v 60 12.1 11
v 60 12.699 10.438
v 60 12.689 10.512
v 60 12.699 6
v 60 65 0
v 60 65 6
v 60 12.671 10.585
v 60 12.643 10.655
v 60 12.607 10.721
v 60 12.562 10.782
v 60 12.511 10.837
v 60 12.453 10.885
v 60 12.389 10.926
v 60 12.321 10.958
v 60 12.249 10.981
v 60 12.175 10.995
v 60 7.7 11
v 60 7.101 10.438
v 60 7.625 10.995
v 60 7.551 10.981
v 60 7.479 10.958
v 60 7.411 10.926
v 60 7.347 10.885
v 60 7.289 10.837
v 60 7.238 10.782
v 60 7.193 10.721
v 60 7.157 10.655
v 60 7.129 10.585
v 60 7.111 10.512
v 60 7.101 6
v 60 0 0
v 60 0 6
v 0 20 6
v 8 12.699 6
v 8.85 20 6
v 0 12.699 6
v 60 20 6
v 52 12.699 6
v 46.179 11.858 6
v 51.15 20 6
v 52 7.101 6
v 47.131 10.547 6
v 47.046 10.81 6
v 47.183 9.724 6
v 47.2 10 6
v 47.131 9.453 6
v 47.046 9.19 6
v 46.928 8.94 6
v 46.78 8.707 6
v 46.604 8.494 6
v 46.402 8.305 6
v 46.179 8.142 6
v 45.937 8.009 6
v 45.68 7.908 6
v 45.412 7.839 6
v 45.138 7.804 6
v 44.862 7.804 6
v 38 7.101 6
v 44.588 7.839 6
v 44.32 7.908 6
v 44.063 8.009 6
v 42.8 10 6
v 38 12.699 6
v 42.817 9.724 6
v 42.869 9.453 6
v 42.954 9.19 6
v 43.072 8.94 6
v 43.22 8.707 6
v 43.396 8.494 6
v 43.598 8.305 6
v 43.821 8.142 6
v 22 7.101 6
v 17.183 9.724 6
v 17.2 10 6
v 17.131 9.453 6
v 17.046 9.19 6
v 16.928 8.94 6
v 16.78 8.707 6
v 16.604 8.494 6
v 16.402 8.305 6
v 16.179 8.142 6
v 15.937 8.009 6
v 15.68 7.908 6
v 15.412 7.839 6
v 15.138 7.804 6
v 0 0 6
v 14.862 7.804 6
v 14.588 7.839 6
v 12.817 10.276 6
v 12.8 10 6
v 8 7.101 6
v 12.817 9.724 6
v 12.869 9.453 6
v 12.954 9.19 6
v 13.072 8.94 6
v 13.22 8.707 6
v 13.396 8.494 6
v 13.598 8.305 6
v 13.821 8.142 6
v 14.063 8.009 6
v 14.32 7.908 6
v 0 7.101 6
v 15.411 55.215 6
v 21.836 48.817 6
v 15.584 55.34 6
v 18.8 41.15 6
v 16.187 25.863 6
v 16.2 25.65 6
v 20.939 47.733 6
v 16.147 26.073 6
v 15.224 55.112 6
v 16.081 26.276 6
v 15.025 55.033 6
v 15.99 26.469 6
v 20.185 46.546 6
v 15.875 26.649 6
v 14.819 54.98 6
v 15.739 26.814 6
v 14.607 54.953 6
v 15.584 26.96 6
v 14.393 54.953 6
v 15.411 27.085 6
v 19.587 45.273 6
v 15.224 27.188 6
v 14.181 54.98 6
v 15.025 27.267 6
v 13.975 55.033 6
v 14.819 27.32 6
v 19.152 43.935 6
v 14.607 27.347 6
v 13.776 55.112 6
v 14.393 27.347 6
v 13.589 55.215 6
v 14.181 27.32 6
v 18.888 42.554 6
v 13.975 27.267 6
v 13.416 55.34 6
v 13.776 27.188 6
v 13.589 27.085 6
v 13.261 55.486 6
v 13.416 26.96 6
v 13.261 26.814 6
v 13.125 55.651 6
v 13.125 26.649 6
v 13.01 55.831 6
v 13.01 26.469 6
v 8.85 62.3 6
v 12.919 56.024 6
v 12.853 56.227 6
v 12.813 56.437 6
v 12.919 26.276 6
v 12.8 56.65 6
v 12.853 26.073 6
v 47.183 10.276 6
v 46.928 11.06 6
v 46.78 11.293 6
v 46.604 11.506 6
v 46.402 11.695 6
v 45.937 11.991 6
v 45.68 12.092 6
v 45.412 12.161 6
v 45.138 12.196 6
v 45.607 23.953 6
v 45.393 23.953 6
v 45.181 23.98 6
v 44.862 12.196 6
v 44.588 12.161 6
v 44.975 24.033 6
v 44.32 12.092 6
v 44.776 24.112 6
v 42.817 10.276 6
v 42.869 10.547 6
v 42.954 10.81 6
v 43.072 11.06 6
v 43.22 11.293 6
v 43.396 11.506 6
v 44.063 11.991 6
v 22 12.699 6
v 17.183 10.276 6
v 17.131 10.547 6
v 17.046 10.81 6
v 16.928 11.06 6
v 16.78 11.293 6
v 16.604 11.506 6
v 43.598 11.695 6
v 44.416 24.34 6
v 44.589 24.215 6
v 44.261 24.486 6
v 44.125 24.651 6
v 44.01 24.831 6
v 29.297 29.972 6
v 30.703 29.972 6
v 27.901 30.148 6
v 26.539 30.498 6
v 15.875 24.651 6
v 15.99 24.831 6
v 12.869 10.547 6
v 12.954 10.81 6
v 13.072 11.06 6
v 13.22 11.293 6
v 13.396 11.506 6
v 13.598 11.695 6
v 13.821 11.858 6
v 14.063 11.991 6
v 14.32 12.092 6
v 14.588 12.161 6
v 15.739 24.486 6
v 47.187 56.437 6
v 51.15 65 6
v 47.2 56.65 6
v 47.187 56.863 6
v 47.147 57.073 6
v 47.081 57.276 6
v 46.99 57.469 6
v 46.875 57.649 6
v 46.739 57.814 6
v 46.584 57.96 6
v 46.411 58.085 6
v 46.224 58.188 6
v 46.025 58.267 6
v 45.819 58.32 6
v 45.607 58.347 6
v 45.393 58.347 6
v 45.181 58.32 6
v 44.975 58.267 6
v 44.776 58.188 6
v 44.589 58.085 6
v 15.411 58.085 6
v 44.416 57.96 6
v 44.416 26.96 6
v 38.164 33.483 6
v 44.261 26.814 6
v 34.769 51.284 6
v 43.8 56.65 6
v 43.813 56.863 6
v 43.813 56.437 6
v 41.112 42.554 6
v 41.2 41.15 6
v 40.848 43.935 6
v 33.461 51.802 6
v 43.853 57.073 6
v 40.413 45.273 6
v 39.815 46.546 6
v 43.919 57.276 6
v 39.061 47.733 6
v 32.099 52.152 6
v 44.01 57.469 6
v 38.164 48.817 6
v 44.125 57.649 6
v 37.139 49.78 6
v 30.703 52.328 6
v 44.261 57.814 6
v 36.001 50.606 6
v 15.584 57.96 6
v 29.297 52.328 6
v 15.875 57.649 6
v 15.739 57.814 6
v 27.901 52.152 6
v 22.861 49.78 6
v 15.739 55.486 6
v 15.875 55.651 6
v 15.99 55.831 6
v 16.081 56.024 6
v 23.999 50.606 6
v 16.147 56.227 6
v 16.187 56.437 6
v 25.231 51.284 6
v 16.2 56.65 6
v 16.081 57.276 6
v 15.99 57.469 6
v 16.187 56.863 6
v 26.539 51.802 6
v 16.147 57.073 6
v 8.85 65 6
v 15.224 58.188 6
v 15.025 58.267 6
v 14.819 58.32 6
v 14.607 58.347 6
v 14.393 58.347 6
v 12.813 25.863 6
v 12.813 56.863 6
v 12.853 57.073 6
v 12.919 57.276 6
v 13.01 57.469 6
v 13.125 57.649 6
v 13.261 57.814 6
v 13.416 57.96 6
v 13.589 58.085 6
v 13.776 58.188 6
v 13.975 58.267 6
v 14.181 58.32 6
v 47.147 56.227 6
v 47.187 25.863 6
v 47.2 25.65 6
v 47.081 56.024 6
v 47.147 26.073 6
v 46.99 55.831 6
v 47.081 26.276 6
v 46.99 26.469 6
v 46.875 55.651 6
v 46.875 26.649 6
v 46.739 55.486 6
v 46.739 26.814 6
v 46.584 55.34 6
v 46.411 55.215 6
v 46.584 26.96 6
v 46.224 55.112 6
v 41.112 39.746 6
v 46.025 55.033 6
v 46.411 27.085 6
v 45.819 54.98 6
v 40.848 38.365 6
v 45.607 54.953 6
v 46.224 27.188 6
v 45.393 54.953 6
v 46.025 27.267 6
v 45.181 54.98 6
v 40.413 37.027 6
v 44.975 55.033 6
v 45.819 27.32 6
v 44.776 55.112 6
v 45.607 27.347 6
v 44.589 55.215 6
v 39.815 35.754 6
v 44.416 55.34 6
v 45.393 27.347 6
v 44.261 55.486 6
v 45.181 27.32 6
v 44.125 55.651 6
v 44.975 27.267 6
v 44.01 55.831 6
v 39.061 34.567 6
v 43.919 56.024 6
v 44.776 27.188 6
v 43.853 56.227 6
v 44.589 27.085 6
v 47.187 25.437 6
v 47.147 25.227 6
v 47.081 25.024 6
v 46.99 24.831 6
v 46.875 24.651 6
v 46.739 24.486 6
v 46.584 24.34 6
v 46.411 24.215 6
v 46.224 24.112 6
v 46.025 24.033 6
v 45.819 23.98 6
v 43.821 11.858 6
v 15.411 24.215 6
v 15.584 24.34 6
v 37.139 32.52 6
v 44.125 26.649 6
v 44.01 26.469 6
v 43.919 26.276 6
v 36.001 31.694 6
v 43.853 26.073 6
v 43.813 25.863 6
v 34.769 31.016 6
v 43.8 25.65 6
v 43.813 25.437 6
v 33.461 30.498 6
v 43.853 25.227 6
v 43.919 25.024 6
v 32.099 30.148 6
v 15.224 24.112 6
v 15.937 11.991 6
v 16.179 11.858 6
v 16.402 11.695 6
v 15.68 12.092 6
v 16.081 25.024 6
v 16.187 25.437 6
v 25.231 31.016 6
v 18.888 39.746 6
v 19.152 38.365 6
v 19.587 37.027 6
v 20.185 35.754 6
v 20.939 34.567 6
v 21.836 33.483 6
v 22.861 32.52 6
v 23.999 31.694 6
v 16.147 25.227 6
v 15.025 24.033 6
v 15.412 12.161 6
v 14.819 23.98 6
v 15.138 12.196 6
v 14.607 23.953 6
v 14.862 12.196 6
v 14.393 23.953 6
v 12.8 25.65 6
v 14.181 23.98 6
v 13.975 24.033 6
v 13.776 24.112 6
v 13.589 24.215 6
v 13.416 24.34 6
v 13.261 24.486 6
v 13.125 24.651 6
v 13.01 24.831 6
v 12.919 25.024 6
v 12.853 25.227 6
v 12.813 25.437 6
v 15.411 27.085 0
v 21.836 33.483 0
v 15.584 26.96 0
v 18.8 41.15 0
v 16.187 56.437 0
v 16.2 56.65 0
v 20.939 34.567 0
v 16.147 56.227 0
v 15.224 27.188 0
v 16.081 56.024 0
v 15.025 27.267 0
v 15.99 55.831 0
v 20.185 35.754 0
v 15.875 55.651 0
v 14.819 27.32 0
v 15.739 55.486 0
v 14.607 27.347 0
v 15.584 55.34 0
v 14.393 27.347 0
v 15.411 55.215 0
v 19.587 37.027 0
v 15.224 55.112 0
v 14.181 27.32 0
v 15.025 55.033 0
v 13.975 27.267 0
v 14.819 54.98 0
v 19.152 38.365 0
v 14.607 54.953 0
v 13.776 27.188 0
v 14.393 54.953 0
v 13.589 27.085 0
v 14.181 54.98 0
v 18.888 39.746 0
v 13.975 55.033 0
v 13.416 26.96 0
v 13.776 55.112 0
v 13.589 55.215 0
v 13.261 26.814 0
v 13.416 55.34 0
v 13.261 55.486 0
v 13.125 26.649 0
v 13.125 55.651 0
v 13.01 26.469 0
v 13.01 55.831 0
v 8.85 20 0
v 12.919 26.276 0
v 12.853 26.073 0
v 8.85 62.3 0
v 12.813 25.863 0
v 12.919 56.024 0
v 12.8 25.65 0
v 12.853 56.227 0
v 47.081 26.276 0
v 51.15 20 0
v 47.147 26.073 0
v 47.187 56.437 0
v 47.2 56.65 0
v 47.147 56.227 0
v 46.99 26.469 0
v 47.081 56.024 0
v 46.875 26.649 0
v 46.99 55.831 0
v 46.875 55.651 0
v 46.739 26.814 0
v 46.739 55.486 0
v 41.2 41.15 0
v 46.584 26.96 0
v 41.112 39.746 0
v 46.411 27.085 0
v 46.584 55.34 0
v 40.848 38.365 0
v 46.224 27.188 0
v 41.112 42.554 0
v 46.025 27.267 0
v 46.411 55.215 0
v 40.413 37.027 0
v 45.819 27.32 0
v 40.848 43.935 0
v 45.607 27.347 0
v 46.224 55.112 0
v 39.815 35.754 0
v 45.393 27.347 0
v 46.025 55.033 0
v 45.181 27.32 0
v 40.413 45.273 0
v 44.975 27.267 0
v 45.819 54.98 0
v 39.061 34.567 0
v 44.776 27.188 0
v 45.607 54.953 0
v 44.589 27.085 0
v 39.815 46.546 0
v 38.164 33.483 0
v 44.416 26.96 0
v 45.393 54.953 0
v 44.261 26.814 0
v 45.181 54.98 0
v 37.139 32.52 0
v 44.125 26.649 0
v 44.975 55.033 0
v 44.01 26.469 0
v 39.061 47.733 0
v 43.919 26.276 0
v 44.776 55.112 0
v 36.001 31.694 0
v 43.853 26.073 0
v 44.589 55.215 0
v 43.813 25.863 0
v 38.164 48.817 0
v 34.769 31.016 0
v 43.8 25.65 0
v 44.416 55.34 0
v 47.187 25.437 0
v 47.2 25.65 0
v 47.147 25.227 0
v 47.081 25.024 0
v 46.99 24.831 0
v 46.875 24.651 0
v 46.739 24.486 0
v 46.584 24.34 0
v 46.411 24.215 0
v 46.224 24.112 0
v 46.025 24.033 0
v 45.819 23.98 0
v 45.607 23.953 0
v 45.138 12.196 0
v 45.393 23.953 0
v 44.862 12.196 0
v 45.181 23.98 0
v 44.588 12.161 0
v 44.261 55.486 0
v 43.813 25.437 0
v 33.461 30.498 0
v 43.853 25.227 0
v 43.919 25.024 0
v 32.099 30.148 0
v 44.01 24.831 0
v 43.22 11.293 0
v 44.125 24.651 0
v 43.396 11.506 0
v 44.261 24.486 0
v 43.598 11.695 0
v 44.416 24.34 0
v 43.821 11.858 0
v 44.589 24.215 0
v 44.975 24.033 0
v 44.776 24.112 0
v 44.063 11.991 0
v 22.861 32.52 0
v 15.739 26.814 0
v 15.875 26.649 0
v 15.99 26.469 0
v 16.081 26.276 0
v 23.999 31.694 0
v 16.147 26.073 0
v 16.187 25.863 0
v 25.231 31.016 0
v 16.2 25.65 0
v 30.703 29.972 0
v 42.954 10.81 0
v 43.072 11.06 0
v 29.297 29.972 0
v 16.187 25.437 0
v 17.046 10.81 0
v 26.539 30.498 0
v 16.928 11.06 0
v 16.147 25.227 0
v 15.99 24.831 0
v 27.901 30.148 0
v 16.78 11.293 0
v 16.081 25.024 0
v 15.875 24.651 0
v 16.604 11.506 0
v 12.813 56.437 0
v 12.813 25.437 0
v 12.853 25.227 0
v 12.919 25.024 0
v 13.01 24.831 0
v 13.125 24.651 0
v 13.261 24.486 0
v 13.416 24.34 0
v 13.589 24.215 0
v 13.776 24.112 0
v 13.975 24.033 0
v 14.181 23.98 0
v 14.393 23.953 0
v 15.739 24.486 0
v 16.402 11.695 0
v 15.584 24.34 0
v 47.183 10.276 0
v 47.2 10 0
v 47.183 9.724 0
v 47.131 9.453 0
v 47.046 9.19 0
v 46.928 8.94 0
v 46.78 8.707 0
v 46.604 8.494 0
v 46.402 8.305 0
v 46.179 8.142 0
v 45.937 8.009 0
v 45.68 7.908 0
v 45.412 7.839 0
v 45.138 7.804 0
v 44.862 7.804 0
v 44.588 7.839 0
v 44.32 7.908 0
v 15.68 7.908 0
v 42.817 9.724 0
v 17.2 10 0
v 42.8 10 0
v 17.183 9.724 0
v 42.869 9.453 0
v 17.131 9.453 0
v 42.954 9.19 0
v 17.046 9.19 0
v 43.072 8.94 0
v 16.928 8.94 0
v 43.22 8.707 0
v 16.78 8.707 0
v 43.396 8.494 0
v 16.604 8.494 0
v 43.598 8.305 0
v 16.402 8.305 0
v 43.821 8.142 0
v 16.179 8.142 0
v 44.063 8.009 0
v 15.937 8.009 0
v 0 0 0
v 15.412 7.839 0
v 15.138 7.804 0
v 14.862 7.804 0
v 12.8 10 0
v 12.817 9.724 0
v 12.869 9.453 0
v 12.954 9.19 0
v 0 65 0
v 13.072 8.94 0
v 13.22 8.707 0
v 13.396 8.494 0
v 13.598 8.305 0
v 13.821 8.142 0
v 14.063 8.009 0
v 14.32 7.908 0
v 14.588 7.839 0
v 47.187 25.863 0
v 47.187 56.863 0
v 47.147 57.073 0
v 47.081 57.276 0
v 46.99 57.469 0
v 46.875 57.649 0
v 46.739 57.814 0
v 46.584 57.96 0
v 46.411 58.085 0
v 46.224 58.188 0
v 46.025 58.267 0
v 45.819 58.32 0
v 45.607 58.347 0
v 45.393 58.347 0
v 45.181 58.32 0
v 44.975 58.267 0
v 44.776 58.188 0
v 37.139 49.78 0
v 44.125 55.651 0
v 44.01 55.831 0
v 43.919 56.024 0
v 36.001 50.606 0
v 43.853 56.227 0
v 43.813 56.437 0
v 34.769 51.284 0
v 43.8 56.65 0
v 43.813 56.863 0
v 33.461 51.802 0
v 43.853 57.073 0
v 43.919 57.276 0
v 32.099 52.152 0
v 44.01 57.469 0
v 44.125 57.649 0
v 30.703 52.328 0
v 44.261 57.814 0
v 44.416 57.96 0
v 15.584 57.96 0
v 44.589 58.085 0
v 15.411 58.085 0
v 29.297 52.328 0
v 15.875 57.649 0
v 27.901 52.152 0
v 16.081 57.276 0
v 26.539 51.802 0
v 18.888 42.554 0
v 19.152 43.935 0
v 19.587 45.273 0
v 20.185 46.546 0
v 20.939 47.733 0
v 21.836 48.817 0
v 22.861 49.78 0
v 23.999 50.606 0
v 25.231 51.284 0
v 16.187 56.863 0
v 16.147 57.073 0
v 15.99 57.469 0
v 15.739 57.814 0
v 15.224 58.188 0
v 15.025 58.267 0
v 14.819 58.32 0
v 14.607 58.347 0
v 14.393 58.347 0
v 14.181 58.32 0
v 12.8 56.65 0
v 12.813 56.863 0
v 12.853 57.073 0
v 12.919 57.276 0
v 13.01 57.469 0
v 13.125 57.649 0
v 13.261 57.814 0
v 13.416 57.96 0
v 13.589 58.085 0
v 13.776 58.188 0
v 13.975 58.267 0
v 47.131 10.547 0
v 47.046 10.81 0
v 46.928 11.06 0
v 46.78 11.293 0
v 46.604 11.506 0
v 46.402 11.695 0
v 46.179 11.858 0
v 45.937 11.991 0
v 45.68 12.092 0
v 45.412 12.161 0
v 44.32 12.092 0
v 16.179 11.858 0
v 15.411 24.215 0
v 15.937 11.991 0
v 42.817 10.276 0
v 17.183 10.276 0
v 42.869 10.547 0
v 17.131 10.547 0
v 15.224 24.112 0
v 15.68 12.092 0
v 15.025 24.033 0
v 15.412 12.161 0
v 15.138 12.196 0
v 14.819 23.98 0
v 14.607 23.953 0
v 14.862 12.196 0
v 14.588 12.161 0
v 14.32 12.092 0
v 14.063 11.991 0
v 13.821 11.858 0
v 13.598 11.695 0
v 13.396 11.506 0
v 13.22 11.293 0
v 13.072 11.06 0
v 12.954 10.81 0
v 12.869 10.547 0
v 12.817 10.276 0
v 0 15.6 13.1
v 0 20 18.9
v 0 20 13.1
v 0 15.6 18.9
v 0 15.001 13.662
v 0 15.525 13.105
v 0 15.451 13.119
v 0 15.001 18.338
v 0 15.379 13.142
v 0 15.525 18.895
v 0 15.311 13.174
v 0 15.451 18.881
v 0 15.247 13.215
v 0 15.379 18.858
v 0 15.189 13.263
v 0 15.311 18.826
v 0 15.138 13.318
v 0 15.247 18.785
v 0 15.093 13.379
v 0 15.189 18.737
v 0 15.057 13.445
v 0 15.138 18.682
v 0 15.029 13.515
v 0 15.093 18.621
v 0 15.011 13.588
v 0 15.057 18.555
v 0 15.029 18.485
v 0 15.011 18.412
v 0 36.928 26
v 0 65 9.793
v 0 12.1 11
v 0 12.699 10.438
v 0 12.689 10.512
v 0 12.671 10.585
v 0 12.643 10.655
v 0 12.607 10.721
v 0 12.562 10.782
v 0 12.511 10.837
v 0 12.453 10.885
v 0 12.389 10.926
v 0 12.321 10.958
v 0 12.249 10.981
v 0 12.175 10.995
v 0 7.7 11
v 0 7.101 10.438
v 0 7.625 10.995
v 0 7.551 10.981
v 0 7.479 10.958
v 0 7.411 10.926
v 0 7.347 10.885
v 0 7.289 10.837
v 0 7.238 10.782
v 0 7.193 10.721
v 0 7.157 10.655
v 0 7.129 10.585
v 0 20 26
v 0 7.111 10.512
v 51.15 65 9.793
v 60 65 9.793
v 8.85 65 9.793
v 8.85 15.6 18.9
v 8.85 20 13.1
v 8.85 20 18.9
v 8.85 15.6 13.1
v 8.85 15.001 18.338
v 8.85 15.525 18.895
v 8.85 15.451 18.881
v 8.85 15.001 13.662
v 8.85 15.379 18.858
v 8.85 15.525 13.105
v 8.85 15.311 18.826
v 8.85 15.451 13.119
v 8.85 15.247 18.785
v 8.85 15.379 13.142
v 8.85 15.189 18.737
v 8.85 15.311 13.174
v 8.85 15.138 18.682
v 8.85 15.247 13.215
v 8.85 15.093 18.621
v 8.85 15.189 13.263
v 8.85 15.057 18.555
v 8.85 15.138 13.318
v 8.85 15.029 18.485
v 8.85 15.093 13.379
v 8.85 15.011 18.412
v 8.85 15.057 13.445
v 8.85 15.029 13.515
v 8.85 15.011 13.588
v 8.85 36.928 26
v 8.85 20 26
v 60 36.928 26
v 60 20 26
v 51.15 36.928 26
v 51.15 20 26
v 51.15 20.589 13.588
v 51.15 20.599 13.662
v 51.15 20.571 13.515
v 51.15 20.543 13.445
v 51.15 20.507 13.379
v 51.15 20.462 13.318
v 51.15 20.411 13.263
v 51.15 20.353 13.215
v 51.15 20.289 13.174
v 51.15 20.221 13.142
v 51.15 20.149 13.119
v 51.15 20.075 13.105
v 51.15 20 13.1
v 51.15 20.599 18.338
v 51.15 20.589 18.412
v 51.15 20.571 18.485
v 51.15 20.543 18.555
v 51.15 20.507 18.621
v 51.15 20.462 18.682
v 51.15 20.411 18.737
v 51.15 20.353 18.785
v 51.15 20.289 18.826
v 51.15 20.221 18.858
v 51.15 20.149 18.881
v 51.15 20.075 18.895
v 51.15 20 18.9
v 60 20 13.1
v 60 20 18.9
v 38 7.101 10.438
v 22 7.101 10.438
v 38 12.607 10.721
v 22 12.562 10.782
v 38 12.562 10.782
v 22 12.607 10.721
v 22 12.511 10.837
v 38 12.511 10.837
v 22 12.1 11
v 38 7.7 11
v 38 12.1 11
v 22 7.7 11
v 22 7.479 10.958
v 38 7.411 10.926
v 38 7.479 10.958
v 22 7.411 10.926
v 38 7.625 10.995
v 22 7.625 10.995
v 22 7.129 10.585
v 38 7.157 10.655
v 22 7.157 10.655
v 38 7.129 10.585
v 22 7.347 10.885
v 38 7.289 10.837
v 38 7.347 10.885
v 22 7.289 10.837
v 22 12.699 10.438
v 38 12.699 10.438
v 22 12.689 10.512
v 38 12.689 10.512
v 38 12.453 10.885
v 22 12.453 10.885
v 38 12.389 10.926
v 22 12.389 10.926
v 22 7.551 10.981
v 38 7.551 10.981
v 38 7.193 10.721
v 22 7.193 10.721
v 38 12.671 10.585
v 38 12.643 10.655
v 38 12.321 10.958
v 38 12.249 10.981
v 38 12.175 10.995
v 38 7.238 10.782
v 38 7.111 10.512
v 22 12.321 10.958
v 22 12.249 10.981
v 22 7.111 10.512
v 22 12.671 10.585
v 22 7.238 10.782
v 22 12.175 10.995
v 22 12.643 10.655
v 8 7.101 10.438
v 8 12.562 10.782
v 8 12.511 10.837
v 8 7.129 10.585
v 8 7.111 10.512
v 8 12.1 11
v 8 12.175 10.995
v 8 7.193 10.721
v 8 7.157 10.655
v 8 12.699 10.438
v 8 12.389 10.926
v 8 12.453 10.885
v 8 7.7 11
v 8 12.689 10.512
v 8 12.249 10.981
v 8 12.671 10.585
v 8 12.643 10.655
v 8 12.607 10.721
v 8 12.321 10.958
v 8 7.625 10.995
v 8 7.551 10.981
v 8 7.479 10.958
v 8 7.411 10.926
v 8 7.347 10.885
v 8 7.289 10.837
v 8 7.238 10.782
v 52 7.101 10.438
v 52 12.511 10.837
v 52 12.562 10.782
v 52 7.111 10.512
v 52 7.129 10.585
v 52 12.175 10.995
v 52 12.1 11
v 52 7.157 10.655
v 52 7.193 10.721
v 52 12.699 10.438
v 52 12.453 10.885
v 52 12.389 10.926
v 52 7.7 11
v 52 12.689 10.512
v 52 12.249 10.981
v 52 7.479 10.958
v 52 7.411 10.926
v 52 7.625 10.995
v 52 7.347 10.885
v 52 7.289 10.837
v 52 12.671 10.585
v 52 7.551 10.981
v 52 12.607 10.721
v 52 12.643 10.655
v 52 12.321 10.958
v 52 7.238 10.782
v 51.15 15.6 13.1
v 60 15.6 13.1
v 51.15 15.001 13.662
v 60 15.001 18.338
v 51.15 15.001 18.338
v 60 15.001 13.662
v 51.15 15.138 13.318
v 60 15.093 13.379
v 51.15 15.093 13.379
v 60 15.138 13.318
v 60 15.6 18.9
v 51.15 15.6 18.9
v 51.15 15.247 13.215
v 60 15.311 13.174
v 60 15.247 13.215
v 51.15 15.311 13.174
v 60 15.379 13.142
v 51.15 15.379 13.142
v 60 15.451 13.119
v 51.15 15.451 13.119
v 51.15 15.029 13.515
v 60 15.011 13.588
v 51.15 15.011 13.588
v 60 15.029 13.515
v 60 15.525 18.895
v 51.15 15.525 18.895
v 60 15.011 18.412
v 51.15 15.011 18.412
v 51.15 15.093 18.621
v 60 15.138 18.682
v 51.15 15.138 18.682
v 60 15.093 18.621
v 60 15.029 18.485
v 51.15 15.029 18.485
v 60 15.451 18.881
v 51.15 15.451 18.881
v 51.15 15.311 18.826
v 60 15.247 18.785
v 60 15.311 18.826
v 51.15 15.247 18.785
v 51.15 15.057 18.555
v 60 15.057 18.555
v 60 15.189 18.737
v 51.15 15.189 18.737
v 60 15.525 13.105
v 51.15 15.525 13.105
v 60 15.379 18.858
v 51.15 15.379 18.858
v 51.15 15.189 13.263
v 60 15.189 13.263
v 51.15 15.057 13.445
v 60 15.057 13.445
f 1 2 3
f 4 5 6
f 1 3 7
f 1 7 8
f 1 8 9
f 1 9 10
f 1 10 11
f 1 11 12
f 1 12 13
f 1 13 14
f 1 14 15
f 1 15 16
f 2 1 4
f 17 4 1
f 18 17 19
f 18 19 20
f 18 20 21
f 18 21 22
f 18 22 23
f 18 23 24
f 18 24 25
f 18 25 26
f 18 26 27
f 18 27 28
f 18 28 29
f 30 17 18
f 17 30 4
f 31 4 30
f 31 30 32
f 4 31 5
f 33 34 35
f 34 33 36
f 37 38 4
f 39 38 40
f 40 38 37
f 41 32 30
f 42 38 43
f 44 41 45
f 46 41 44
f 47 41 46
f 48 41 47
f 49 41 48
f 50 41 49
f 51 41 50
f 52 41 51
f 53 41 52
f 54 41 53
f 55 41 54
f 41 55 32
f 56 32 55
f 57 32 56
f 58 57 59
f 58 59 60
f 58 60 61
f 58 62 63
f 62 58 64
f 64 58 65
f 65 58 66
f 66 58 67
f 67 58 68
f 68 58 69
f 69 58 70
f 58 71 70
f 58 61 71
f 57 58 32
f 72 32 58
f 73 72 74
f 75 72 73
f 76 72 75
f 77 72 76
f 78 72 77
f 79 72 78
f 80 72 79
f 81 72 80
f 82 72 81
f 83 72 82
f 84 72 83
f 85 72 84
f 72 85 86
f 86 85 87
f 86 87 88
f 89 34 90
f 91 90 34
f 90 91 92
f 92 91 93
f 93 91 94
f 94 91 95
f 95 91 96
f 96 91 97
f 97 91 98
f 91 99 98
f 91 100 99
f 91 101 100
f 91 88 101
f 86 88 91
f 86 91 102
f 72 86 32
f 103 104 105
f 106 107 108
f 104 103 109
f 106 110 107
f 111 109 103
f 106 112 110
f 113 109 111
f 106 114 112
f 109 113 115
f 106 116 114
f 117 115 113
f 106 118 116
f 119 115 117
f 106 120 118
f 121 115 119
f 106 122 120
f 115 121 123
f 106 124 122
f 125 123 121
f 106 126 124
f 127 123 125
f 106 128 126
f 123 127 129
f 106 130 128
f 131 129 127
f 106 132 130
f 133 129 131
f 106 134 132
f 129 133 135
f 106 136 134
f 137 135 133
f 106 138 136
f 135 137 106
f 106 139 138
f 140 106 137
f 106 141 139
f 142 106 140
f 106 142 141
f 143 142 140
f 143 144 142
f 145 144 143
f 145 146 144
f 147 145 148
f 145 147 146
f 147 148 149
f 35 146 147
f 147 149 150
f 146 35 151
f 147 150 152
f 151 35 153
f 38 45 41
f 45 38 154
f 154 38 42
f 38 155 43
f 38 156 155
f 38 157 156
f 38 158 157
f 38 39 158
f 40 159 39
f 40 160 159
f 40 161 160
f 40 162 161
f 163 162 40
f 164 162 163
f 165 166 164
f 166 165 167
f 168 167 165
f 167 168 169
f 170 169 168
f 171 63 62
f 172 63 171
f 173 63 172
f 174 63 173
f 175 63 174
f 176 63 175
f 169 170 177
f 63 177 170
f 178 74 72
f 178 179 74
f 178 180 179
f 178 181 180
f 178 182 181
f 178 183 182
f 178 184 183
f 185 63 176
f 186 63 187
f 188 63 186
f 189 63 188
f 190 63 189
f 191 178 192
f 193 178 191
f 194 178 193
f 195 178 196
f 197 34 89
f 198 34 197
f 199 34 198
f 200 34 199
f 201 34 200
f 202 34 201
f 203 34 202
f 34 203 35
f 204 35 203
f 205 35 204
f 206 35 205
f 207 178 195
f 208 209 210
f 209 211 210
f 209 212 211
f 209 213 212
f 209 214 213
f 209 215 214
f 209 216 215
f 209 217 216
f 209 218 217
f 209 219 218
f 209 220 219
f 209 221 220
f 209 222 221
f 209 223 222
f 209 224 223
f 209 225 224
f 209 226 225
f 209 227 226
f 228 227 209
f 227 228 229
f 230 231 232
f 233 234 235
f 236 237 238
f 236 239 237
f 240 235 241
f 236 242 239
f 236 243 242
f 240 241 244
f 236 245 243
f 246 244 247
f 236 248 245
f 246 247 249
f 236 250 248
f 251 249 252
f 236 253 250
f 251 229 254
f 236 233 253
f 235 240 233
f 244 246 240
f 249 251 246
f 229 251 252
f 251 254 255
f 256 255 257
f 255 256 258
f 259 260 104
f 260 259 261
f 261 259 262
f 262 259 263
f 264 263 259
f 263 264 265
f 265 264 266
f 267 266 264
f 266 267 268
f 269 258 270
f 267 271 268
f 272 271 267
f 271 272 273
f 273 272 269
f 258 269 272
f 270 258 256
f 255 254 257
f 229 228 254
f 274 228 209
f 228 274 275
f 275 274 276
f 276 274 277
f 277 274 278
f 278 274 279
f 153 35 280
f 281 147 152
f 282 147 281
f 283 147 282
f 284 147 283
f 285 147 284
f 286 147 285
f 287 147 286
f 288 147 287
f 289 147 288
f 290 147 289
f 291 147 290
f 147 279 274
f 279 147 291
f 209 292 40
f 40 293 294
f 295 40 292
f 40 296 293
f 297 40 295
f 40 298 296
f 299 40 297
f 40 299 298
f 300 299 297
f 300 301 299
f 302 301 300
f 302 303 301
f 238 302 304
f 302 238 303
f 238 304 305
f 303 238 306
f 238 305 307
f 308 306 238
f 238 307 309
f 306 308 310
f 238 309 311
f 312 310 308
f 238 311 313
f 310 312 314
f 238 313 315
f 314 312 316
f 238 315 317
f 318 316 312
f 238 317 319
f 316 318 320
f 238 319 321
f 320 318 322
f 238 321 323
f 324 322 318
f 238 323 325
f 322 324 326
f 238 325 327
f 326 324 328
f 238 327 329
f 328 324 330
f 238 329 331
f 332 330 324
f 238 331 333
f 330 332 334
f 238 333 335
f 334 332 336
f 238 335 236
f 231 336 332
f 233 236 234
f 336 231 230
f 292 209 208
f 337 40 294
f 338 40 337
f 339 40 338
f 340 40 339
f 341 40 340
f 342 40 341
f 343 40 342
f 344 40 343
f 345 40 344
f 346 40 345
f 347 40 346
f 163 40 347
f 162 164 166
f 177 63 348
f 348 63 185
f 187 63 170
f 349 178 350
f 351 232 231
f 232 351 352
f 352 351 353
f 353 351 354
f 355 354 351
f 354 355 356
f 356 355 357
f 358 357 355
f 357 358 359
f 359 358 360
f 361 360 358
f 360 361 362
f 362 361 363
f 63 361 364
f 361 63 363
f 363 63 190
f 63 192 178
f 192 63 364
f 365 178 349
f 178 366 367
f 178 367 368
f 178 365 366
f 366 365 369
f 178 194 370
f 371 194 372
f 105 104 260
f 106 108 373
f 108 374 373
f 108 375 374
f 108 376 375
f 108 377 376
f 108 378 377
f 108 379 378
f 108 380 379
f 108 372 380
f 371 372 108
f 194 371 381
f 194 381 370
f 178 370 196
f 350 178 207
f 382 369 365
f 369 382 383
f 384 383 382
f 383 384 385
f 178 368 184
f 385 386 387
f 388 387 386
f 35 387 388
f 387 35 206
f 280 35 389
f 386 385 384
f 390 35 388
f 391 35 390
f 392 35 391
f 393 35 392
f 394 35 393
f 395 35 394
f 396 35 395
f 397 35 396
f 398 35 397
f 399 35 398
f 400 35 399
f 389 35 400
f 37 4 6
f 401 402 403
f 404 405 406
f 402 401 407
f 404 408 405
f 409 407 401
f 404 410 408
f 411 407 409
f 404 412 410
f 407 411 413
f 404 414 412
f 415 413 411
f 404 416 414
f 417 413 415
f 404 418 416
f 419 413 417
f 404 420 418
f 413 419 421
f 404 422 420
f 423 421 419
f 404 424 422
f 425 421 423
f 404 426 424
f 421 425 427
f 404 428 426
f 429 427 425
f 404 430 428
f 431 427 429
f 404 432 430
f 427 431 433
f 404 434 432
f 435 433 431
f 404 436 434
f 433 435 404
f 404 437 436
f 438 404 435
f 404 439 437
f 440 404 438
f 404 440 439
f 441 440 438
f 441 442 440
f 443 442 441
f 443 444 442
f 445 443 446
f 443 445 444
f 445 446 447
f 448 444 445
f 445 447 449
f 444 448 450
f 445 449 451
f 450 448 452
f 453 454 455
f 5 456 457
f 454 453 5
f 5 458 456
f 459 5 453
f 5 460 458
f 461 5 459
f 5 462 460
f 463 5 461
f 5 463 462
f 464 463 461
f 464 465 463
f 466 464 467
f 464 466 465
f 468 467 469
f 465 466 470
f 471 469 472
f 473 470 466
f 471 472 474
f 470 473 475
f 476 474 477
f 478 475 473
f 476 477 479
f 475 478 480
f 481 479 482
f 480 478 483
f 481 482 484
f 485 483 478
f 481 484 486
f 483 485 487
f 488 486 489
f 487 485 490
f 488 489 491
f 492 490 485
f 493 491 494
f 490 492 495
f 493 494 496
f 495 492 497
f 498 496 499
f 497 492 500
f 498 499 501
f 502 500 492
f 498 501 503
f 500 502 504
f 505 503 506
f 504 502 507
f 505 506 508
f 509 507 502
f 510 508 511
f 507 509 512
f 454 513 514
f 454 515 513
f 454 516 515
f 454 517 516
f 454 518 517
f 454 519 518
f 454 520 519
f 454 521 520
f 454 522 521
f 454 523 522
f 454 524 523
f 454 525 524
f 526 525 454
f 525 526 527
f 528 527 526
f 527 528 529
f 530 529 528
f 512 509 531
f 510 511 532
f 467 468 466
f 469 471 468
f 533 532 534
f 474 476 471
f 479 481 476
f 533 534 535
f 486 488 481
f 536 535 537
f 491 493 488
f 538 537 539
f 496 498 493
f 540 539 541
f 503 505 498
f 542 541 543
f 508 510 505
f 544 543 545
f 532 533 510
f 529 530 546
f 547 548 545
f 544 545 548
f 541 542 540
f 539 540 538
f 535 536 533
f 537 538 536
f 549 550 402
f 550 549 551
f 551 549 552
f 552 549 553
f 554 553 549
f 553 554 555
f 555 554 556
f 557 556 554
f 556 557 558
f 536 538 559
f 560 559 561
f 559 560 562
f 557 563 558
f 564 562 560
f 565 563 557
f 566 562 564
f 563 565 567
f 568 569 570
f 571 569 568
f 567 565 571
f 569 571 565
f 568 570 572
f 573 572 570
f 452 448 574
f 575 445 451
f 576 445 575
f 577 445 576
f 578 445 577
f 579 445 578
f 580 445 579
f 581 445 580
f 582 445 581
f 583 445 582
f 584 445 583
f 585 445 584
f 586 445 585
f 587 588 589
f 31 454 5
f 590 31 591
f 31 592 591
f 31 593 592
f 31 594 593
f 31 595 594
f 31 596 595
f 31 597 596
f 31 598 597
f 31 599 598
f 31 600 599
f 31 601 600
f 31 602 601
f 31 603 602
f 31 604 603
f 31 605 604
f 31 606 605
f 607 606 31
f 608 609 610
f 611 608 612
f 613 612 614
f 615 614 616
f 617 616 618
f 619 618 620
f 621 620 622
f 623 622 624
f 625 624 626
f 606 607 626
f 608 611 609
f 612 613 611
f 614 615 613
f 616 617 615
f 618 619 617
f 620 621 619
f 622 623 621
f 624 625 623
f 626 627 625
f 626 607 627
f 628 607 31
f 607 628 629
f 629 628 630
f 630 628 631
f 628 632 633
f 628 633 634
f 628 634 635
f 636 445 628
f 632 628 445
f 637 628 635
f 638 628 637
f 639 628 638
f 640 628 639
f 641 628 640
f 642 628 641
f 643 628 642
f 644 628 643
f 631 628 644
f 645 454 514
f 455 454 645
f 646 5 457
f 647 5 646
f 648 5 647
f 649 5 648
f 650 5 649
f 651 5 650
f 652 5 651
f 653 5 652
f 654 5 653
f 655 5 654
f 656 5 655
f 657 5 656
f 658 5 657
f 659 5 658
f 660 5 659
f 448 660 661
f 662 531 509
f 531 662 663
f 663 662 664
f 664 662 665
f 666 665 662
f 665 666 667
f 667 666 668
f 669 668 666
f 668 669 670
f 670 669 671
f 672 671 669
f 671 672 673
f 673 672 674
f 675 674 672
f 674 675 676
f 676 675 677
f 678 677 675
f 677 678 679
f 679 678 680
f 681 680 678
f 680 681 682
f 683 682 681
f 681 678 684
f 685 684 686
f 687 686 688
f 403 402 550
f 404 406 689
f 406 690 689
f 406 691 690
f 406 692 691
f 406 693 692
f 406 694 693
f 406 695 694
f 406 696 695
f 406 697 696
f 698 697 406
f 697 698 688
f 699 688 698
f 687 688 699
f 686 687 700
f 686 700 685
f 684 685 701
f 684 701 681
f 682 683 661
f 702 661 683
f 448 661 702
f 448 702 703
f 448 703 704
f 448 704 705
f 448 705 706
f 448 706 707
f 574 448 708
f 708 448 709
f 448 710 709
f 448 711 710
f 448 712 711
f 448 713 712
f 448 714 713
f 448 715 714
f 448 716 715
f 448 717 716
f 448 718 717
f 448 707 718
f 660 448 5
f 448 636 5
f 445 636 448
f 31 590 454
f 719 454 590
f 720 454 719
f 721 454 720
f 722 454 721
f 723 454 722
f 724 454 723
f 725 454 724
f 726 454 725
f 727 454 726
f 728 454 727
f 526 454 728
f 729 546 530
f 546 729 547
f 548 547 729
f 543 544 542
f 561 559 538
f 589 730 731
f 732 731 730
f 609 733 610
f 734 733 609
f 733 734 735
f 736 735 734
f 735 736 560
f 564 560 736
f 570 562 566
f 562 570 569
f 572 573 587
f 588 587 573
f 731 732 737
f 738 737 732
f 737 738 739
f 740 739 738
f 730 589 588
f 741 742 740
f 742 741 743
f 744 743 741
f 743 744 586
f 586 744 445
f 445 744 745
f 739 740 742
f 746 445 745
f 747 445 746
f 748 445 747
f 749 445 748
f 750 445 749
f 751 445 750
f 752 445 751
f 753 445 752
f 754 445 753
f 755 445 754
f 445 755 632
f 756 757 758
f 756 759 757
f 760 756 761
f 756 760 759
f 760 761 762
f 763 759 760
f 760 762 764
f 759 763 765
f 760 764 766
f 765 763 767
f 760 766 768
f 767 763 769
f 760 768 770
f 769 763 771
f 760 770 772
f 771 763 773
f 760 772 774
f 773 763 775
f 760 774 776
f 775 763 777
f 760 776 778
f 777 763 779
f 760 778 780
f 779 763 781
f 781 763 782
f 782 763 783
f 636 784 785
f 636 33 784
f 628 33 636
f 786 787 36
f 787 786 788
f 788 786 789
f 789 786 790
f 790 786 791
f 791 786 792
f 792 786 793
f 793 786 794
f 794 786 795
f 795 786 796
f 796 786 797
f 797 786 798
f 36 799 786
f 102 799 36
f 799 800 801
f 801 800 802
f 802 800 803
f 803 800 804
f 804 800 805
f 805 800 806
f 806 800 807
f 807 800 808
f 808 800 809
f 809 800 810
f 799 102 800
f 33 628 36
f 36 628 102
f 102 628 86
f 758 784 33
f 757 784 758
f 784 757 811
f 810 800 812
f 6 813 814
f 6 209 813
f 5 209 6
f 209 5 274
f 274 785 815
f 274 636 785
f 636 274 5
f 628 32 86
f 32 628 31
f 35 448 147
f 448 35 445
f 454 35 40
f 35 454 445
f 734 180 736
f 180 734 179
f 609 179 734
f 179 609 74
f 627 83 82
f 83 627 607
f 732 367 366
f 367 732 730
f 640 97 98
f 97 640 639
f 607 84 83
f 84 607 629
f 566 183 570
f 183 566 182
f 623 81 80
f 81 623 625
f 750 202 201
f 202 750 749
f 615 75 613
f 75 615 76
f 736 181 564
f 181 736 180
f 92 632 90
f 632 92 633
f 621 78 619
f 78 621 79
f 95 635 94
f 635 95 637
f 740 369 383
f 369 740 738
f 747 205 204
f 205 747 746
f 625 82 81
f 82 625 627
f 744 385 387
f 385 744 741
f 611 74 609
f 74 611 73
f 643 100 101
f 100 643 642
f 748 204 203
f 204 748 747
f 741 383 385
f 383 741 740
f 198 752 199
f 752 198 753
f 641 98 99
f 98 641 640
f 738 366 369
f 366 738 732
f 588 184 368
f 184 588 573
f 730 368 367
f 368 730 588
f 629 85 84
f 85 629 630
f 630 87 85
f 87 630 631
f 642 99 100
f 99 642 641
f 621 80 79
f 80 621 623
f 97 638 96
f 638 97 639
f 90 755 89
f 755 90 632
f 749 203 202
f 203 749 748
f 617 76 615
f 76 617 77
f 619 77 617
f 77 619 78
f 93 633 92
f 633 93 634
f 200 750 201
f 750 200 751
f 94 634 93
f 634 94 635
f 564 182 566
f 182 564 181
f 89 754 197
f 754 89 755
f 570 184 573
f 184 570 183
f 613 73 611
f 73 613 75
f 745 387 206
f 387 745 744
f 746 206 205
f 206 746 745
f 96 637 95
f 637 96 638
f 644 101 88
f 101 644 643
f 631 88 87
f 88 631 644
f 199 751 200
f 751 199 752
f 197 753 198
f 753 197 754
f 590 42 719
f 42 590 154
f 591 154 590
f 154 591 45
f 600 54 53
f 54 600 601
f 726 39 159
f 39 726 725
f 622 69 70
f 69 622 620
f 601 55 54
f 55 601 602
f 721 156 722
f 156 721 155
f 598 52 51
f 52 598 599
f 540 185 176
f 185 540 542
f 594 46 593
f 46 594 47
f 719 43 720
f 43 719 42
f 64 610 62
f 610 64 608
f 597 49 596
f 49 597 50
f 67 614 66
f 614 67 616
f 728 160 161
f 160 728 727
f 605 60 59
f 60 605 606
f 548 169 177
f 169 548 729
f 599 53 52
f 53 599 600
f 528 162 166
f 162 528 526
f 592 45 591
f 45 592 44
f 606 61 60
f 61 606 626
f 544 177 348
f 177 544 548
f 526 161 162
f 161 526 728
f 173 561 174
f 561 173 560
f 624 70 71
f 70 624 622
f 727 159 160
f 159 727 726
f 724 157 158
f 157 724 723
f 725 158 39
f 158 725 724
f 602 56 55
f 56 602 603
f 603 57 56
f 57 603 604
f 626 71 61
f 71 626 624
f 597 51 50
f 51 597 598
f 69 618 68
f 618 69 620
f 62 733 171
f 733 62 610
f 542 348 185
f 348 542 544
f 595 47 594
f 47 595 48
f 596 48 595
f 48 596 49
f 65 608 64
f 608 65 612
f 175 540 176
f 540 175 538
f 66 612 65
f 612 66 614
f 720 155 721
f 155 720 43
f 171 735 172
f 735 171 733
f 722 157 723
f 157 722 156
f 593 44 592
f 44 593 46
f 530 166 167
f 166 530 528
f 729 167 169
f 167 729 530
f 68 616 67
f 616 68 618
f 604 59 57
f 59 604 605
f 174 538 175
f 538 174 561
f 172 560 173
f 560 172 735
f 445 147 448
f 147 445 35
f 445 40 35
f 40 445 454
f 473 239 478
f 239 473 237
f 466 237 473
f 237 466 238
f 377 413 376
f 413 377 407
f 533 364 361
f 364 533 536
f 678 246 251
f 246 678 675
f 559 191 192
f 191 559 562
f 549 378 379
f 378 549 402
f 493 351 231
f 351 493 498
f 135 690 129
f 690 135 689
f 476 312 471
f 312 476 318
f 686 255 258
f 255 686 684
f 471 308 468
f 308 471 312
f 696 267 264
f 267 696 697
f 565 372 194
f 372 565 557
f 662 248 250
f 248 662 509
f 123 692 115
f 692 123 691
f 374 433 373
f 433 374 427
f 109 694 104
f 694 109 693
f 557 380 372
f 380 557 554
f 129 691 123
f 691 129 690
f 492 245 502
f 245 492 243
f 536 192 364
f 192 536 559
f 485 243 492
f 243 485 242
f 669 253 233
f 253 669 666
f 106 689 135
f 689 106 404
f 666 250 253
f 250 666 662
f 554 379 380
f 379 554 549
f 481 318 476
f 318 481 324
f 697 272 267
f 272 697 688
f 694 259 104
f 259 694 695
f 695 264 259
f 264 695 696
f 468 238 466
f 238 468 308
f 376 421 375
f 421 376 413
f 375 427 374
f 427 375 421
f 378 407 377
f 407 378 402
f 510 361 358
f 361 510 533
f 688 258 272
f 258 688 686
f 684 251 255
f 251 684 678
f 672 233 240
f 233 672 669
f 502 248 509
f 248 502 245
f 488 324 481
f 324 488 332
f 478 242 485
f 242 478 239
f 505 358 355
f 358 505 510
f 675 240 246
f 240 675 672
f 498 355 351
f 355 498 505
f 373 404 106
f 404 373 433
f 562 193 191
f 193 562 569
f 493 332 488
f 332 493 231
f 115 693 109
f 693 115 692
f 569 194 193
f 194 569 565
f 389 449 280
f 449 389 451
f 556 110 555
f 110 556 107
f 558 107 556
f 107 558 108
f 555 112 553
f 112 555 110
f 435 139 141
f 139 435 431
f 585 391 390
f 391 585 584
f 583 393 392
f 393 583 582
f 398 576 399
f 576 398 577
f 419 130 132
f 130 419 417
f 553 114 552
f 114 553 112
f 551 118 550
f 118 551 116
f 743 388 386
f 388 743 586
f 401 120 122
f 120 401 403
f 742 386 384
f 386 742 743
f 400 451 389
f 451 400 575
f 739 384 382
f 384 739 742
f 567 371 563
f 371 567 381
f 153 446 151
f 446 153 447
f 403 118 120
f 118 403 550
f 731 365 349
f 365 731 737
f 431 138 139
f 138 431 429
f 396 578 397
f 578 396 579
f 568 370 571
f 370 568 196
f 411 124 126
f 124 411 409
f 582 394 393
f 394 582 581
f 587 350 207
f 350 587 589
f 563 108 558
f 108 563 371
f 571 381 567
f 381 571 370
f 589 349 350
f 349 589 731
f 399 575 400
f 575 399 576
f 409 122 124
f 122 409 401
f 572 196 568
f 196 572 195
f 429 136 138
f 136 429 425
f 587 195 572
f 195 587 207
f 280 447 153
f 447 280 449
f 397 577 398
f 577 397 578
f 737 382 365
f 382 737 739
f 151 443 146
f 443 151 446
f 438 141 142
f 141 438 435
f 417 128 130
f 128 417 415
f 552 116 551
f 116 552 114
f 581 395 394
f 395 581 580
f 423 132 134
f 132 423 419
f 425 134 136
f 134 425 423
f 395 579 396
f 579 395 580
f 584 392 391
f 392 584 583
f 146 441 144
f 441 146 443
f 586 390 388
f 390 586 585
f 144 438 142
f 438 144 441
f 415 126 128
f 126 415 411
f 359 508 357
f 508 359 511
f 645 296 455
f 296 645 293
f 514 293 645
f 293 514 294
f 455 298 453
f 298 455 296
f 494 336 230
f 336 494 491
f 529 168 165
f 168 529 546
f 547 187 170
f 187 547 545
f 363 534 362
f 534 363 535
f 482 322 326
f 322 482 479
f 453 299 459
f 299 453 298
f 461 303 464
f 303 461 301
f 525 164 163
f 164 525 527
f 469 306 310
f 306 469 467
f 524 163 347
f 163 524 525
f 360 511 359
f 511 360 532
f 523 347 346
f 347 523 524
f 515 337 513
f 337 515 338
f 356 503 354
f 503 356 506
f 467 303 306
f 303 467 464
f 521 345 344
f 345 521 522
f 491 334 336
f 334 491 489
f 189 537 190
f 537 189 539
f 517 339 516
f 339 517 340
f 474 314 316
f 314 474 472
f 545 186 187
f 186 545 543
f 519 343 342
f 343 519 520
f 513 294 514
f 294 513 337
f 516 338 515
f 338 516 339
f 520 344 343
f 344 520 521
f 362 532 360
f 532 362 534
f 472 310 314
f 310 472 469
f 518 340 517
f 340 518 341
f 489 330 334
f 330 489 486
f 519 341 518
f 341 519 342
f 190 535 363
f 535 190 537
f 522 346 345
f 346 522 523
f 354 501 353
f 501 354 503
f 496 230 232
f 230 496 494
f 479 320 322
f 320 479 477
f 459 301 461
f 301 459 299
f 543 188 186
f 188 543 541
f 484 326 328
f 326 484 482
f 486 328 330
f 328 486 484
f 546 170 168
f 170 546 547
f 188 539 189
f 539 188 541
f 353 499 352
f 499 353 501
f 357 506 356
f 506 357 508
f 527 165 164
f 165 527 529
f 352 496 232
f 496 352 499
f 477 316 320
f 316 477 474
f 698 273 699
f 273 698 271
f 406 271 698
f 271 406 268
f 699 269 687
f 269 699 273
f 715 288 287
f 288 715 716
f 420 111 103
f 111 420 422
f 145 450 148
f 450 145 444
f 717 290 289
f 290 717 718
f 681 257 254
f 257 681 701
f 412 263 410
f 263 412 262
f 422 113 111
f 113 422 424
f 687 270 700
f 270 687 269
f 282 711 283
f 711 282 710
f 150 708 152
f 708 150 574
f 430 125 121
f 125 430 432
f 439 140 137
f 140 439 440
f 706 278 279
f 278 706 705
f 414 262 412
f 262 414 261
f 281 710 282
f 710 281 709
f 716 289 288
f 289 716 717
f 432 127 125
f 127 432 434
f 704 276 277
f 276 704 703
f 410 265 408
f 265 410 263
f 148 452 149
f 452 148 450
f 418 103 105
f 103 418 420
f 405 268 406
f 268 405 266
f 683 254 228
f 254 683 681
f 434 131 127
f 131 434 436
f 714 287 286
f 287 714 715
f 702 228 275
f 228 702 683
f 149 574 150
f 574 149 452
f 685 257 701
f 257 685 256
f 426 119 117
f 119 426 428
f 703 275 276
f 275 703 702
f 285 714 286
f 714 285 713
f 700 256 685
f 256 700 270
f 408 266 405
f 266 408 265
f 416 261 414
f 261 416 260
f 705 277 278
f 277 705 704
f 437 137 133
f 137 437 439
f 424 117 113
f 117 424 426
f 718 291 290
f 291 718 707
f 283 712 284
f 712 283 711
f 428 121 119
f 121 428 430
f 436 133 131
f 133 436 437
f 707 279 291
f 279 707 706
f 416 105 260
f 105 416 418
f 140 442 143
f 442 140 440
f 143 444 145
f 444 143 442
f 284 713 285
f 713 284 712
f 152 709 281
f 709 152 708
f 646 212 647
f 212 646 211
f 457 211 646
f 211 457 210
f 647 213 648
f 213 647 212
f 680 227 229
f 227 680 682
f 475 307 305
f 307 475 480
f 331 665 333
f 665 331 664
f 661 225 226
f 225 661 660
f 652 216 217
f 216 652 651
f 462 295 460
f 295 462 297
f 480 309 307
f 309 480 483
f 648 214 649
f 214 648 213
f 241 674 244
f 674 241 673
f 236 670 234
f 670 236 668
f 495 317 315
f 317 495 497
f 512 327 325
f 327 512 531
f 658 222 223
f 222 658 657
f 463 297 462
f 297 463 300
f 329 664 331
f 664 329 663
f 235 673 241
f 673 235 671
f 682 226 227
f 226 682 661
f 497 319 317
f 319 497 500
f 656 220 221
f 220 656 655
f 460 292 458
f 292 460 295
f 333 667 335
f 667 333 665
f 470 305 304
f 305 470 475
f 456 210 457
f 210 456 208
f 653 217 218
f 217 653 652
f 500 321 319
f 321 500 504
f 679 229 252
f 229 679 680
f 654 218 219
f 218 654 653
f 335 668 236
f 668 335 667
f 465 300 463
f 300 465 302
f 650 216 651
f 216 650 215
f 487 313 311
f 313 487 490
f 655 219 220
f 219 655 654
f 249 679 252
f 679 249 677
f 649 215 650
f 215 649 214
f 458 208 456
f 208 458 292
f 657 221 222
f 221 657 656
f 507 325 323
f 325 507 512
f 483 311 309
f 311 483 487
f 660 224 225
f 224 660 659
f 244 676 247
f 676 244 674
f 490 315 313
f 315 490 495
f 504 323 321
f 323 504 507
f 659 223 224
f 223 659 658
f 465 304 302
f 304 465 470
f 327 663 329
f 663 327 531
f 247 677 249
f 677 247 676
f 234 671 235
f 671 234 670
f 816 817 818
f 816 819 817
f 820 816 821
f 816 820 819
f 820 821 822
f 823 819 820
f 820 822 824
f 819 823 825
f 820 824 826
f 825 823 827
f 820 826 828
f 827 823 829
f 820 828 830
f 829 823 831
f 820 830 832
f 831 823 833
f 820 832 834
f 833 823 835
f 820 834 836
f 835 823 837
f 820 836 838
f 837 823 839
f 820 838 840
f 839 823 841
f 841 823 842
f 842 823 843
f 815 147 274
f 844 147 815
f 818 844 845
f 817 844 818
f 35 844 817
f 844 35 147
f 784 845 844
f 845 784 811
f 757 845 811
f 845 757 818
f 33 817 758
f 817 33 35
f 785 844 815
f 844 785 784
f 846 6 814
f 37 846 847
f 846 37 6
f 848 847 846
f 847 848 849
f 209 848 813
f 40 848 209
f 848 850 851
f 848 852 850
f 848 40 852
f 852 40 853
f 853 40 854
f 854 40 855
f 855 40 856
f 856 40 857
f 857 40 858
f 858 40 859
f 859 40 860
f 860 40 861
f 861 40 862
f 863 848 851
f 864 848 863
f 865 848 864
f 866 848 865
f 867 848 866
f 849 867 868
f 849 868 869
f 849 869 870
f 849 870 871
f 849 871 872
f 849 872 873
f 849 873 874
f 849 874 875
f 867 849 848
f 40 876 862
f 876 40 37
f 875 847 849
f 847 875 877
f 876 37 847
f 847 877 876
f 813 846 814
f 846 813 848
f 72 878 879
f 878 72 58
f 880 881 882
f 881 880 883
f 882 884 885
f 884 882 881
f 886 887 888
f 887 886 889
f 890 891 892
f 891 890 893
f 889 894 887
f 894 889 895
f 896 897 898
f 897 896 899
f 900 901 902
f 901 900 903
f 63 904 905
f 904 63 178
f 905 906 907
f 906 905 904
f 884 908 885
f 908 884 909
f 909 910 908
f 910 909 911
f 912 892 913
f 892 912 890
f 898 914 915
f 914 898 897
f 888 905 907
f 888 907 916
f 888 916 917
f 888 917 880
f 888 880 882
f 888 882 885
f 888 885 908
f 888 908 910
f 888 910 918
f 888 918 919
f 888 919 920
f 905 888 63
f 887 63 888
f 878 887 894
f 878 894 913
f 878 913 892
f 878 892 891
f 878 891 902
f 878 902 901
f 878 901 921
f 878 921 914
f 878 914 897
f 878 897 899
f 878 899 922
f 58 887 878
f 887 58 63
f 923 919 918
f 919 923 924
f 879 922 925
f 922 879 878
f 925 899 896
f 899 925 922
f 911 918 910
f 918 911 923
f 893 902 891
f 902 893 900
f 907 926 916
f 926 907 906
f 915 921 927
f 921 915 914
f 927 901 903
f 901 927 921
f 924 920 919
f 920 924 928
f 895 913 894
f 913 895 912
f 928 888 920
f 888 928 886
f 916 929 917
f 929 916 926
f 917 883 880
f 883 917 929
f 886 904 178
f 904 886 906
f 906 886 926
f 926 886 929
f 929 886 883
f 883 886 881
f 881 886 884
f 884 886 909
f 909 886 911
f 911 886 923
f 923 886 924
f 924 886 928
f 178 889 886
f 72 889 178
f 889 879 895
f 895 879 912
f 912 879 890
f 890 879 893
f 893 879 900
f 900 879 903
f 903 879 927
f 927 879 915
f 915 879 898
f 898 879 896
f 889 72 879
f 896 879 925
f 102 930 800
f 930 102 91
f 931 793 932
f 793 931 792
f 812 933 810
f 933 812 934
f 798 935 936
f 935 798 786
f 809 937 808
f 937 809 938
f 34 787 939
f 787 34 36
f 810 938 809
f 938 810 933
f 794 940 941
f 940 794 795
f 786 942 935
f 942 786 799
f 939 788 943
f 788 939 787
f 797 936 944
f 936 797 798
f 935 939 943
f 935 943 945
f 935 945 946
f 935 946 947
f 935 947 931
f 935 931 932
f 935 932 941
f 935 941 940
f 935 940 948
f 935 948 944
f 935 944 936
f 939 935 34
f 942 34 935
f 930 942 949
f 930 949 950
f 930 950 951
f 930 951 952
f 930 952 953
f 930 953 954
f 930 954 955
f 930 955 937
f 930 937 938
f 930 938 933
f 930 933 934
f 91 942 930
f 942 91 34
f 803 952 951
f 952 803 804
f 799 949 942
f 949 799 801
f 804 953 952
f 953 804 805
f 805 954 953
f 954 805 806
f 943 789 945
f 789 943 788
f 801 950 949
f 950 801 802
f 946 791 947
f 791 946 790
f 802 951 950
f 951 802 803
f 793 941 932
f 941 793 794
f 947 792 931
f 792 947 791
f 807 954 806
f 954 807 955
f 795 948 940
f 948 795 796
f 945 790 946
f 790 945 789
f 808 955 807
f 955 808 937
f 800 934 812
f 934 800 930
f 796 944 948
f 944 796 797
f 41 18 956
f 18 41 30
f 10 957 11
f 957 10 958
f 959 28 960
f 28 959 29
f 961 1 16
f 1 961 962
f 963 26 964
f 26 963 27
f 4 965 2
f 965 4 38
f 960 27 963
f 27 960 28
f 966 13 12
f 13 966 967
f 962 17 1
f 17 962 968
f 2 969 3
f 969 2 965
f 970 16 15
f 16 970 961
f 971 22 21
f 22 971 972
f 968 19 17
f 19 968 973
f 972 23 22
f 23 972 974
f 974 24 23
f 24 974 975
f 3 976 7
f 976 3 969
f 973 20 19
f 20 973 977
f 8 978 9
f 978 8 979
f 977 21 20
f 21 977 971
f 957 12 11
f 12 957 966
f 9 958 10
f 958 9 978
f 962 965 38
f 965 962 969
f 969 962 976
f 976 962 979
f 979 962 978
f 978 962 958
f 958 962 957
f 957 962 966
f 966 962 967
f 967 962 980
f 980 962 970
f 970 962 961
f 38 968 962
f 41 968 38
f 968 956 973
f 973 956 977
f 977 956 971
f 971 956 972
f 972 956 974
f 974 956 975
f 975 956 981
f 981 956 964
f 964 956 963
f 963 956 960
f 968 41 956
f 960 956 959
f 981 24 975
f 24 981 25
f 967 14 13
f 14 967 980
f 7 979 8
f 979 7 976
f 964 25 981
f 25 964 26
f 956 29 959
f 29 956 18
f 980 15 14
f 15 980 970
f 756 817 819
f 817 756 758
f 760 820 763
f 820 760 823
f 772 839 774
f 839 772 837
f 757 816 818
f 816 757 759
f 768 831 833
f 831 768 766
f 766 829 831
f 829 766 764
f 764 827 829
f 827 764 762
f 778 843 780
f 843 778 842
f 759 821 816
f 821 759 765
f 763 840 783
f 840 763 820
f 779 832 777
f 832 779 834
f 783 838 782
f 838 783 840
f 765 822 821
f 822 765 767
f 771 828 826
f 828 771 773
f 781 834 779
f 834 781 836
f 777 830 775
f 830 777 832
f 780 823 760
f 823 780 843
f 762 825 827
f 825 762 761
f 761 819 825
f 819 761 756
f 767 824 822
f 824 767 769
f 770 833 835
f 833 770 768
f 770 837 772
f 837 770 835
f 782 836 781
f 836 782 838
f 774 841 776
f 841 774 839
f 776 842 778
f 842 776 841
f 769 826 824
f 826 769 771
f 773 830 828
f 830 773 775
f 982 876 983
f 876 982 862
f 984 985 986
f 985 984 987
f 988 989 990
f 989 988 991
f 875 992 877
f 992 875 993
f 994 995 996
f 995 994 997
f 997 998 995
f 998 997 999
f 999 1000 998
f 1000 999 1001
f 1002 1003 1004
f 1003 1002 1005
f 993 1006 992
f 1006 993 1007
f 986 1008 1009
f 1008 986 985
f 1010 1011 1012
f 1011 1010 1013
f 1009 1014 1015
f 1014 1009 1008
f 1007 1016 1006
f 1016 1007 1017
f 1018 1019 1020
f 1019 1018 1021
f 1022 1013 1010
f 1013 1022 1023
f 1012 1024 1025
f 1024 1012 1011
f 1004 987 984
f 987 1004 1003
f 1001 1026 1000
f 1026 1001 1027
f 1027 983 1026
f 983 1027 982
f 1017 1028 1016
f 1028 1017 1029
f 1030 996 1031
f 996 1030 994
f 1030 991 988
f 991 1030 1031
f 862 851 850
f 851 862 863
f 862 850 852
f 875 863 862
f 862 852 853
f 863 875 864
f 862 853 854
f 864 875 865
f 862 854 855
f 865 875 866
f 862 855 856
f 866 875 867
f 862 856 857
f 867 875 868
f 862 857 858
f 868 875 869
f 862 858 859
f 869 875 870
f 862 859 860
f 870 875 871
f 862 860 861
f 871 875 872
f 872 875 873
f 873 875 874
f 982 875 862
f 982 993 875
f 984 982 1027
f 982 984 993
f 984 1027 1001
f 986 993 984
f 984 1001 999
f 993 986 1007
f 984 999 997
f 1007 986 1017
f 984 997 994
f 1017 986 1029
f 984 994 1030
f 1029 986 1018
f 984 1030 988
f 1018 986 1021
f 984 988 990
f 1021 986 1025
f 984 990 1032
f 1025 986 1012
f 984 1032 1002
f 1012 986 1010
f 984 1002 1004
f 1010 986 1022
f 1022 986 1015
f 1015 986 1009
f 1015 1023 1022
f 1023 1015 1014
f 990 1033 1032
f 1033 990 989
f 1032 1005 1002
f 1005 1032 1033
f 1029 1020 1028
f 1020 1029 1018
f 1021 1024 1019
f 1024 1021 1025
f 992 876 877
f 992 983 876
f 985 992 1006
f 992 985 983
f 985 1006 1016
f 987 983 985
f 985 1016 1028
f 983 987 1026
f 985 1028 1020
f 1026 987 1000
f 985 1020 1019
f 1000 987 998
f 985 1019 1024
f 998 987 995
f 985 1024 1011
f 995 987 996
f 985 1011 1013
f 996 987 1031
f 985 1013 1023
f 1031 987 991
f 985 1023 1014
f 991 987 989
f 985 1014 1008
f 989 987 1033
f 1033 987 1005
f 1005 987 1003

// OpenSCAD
// file: ../lib/nutsnbolts/data-access.scad
// Norm Nuts and Bolts - a OpenSCAD library
// Copyright (C) 2012  Johannes Kneer

// This program is free software: you can redistribute it and/or modify
// it under the terms of the GNU General Public License as published by
// the Free Software Foundation, either version 3 of the License, or
// (at your option) any later version.

// This program is distributed in the hope that it will be useful,
// but WITHOUT ANY WARRANTY; without even the implied warranty of
// MERCHANTABILITY or FITNESS FOR A PARTICULAR PURPOSE.  See the
// GNU General Public License for more details.

// You should have received a copy of the GNU General Public License
// along with this program.  If not, see <http://www.gnu.org/licenses/>.


// DATABASE ACCESS FUNCTIONS AND CONSTANTS



// == CONSTANTS == 

// screw table access keys
_NB_S_DESC            = 0;
_NB_S_FAMKEY			 = 1;
_NB_S_LENGTH          = 2;
_NB_S_NOTHREAD_LENGTH = 3;

_NB_F_DESC			 = 0;
_NB_F_OUTER_DIA       = 1;
_NB_F_INNER_DIA       = 2;
_NB_F_LEAD            = 3; 
_NB_F_KEY             = 4;
_NB_F_KEY_DEPTH       = 5;
_NB_F_HEAD_HEIGHT     = 6;
_NB_F_HEAD_DIA        = 7;
_NB_F_NUT_KEY         = 8;
_NB_F_NUT_HEIGHT      = 9;


// == FUNCTIONS ==

// _get_screw("descriptor")   with descriptor = M8x25
//   find the line for a general object in the data matrix

function _get_screw(n) = data_screw[search([n], data_screw)[0]];
function _get_screw_fam(n) = data_screw_fam[search([_get_screw(n)[_NB_S_FAMKEY]], data_screw_fam)[0]];

function _get_fam(n) = data_screw_fam[search([n], data_screw_fam)[0]];


// _get_XXXXX("descriptor") functions
// find a single property in the database

function _get_desc(n)        = _get_screw(n)[_NB_S_DESC];
function _get_famkey(n)         = _get_screw(n)[_NB_S_FAMKEY];
function _get_length(n)      = _get_screw(n)[_NB_S_LENGTH];
function _get_nt_length(n)   = _get_screw(n)[_NB_S_NOTHREAD_LENGTH];

function _get_outer_dia(n)   = _get_screw_fam(n)[_NB_F_OUTER_DIA];
function _get_inner_dia(n)   = _get_screw_fam(n)[_NB_F_INNER_DIA];
function _get_lead(n)        = _get_screw_fam(n)[_NB_F_LEAD];
function _get_head_height(n) = _get_screw_fam(n)[_NB_F_HEAD_HEIGHT];
function _get_head_dia(n)    = _get_screw_fam(n)[_NB_F_HEAD_DIA];
function _get_nut_key(n)     = _get_screw_fam(n)[_NB_F_NUT_KEY];
function _get_nut_height(n)  = _get_screw_fam(n)[_NB_F_NUT_HEIGHT];
// file: ../globals.scad
// Global variables

$fn = 50;
clearance = 0.4; // Nozzle width
// file: nema17_mount.scad
include <../globals.scad>
include <../lib/nutsnbolts/cyl_head_bolt.scad>;

module nema17_mount(h=6)
{
    motor_width = 42.3;
    hole_distance = 31;
    difference(){
        translate([0,0,h/2])cube([motor_width,motor_width,h],center=true);
        cylinder(d=22+clearance,h=h);
        translate([-hole_distance/2,-hole_distance/2,h])hole_through("M3",l=h, cld=clearance);
        translate([hole_distance/2,-hole_distance/2,h])hole_through("M3",l=h, cld=clearance);
        translate([-hole_distance/2,hole_distance/2,h])hole_through("M3",l=h, cld=clearance);
        translate([hole_distance/2,hole_distance/2,h])hole_through("M3",l=h, cld=clearance);
    }
}
// main file
include <nema17_mount.scad>

module z_motor_mount()
{
    difference(){
        cube([60,65,6]);
        translate([30,20+42.3/2,3])cube([42.3,42.3,6],center=true);
        translate([15,10,6])hole_through("M4",l=8, cld=clearance);
        translate([45,10,6])hole_through("M4",l=8, cld=clearance);
    }
    
    translate([22,7.1,11])rotate([0,90,0])translate([0.6,0.6,0])minkowski(){
        cube([4.6,4.4,15]);
        cylinder(d=1.2,h=1);
    }
    translate([0,7.1,11])rotate([0,90,0])translate([0.6,0.6,0])minkowski(){
        cube([4.6,4.4,7]);
        cylinder(d=1.2,h=1);
    }
    translate([52,7.1,11])rotate([0,90,0])translate([0.6,0.6,0])minkowski(){
        cube([4.6,4.4,7]);
        cylinder(d=1.2,h=1);
    }
    
    translate([30,20+42.3/2,0])nema17_mount(h=6);
    difference(){
        translate([0,20,6])cube([8.85,45,20]);
        translate([0,30,30])rotate([-30,0,0])cube([8.85,60,20]);
    }
    translate([60-8.85,0,0])difference(){
        translate([0,20,6])cube([8.85,45,20]);
        translate([0,30,30])rotate([-30,0,0])cube([8.85,60,20]);
    }
    
    translate([0,15,18.9])rotate([0,90,0])translate([0.6,0.6,0])minkowski(){
        cube([4.6,4.4,7.85]);
        cylinder(d=1.2,h=1);
    }
    translate([60-8.85,15,18.9])rotate([0,90,0])translate([0.6,0.6,0])minkowski(){
        cube([4.6,4.4,7.85]);
        cylinder(d=1.2,h=1);
    }
    /*
    translate([0,0,26])cube([60,20,6]);
    translate([0,7.1,26.6])rotate([0,90,0])translate([0.6,0.6,0])minkowski(){
        cube([4.6,4.4,59]);
        cylinder(d=1.2,h=1);
    }
    */
}

z_motor_mount();
